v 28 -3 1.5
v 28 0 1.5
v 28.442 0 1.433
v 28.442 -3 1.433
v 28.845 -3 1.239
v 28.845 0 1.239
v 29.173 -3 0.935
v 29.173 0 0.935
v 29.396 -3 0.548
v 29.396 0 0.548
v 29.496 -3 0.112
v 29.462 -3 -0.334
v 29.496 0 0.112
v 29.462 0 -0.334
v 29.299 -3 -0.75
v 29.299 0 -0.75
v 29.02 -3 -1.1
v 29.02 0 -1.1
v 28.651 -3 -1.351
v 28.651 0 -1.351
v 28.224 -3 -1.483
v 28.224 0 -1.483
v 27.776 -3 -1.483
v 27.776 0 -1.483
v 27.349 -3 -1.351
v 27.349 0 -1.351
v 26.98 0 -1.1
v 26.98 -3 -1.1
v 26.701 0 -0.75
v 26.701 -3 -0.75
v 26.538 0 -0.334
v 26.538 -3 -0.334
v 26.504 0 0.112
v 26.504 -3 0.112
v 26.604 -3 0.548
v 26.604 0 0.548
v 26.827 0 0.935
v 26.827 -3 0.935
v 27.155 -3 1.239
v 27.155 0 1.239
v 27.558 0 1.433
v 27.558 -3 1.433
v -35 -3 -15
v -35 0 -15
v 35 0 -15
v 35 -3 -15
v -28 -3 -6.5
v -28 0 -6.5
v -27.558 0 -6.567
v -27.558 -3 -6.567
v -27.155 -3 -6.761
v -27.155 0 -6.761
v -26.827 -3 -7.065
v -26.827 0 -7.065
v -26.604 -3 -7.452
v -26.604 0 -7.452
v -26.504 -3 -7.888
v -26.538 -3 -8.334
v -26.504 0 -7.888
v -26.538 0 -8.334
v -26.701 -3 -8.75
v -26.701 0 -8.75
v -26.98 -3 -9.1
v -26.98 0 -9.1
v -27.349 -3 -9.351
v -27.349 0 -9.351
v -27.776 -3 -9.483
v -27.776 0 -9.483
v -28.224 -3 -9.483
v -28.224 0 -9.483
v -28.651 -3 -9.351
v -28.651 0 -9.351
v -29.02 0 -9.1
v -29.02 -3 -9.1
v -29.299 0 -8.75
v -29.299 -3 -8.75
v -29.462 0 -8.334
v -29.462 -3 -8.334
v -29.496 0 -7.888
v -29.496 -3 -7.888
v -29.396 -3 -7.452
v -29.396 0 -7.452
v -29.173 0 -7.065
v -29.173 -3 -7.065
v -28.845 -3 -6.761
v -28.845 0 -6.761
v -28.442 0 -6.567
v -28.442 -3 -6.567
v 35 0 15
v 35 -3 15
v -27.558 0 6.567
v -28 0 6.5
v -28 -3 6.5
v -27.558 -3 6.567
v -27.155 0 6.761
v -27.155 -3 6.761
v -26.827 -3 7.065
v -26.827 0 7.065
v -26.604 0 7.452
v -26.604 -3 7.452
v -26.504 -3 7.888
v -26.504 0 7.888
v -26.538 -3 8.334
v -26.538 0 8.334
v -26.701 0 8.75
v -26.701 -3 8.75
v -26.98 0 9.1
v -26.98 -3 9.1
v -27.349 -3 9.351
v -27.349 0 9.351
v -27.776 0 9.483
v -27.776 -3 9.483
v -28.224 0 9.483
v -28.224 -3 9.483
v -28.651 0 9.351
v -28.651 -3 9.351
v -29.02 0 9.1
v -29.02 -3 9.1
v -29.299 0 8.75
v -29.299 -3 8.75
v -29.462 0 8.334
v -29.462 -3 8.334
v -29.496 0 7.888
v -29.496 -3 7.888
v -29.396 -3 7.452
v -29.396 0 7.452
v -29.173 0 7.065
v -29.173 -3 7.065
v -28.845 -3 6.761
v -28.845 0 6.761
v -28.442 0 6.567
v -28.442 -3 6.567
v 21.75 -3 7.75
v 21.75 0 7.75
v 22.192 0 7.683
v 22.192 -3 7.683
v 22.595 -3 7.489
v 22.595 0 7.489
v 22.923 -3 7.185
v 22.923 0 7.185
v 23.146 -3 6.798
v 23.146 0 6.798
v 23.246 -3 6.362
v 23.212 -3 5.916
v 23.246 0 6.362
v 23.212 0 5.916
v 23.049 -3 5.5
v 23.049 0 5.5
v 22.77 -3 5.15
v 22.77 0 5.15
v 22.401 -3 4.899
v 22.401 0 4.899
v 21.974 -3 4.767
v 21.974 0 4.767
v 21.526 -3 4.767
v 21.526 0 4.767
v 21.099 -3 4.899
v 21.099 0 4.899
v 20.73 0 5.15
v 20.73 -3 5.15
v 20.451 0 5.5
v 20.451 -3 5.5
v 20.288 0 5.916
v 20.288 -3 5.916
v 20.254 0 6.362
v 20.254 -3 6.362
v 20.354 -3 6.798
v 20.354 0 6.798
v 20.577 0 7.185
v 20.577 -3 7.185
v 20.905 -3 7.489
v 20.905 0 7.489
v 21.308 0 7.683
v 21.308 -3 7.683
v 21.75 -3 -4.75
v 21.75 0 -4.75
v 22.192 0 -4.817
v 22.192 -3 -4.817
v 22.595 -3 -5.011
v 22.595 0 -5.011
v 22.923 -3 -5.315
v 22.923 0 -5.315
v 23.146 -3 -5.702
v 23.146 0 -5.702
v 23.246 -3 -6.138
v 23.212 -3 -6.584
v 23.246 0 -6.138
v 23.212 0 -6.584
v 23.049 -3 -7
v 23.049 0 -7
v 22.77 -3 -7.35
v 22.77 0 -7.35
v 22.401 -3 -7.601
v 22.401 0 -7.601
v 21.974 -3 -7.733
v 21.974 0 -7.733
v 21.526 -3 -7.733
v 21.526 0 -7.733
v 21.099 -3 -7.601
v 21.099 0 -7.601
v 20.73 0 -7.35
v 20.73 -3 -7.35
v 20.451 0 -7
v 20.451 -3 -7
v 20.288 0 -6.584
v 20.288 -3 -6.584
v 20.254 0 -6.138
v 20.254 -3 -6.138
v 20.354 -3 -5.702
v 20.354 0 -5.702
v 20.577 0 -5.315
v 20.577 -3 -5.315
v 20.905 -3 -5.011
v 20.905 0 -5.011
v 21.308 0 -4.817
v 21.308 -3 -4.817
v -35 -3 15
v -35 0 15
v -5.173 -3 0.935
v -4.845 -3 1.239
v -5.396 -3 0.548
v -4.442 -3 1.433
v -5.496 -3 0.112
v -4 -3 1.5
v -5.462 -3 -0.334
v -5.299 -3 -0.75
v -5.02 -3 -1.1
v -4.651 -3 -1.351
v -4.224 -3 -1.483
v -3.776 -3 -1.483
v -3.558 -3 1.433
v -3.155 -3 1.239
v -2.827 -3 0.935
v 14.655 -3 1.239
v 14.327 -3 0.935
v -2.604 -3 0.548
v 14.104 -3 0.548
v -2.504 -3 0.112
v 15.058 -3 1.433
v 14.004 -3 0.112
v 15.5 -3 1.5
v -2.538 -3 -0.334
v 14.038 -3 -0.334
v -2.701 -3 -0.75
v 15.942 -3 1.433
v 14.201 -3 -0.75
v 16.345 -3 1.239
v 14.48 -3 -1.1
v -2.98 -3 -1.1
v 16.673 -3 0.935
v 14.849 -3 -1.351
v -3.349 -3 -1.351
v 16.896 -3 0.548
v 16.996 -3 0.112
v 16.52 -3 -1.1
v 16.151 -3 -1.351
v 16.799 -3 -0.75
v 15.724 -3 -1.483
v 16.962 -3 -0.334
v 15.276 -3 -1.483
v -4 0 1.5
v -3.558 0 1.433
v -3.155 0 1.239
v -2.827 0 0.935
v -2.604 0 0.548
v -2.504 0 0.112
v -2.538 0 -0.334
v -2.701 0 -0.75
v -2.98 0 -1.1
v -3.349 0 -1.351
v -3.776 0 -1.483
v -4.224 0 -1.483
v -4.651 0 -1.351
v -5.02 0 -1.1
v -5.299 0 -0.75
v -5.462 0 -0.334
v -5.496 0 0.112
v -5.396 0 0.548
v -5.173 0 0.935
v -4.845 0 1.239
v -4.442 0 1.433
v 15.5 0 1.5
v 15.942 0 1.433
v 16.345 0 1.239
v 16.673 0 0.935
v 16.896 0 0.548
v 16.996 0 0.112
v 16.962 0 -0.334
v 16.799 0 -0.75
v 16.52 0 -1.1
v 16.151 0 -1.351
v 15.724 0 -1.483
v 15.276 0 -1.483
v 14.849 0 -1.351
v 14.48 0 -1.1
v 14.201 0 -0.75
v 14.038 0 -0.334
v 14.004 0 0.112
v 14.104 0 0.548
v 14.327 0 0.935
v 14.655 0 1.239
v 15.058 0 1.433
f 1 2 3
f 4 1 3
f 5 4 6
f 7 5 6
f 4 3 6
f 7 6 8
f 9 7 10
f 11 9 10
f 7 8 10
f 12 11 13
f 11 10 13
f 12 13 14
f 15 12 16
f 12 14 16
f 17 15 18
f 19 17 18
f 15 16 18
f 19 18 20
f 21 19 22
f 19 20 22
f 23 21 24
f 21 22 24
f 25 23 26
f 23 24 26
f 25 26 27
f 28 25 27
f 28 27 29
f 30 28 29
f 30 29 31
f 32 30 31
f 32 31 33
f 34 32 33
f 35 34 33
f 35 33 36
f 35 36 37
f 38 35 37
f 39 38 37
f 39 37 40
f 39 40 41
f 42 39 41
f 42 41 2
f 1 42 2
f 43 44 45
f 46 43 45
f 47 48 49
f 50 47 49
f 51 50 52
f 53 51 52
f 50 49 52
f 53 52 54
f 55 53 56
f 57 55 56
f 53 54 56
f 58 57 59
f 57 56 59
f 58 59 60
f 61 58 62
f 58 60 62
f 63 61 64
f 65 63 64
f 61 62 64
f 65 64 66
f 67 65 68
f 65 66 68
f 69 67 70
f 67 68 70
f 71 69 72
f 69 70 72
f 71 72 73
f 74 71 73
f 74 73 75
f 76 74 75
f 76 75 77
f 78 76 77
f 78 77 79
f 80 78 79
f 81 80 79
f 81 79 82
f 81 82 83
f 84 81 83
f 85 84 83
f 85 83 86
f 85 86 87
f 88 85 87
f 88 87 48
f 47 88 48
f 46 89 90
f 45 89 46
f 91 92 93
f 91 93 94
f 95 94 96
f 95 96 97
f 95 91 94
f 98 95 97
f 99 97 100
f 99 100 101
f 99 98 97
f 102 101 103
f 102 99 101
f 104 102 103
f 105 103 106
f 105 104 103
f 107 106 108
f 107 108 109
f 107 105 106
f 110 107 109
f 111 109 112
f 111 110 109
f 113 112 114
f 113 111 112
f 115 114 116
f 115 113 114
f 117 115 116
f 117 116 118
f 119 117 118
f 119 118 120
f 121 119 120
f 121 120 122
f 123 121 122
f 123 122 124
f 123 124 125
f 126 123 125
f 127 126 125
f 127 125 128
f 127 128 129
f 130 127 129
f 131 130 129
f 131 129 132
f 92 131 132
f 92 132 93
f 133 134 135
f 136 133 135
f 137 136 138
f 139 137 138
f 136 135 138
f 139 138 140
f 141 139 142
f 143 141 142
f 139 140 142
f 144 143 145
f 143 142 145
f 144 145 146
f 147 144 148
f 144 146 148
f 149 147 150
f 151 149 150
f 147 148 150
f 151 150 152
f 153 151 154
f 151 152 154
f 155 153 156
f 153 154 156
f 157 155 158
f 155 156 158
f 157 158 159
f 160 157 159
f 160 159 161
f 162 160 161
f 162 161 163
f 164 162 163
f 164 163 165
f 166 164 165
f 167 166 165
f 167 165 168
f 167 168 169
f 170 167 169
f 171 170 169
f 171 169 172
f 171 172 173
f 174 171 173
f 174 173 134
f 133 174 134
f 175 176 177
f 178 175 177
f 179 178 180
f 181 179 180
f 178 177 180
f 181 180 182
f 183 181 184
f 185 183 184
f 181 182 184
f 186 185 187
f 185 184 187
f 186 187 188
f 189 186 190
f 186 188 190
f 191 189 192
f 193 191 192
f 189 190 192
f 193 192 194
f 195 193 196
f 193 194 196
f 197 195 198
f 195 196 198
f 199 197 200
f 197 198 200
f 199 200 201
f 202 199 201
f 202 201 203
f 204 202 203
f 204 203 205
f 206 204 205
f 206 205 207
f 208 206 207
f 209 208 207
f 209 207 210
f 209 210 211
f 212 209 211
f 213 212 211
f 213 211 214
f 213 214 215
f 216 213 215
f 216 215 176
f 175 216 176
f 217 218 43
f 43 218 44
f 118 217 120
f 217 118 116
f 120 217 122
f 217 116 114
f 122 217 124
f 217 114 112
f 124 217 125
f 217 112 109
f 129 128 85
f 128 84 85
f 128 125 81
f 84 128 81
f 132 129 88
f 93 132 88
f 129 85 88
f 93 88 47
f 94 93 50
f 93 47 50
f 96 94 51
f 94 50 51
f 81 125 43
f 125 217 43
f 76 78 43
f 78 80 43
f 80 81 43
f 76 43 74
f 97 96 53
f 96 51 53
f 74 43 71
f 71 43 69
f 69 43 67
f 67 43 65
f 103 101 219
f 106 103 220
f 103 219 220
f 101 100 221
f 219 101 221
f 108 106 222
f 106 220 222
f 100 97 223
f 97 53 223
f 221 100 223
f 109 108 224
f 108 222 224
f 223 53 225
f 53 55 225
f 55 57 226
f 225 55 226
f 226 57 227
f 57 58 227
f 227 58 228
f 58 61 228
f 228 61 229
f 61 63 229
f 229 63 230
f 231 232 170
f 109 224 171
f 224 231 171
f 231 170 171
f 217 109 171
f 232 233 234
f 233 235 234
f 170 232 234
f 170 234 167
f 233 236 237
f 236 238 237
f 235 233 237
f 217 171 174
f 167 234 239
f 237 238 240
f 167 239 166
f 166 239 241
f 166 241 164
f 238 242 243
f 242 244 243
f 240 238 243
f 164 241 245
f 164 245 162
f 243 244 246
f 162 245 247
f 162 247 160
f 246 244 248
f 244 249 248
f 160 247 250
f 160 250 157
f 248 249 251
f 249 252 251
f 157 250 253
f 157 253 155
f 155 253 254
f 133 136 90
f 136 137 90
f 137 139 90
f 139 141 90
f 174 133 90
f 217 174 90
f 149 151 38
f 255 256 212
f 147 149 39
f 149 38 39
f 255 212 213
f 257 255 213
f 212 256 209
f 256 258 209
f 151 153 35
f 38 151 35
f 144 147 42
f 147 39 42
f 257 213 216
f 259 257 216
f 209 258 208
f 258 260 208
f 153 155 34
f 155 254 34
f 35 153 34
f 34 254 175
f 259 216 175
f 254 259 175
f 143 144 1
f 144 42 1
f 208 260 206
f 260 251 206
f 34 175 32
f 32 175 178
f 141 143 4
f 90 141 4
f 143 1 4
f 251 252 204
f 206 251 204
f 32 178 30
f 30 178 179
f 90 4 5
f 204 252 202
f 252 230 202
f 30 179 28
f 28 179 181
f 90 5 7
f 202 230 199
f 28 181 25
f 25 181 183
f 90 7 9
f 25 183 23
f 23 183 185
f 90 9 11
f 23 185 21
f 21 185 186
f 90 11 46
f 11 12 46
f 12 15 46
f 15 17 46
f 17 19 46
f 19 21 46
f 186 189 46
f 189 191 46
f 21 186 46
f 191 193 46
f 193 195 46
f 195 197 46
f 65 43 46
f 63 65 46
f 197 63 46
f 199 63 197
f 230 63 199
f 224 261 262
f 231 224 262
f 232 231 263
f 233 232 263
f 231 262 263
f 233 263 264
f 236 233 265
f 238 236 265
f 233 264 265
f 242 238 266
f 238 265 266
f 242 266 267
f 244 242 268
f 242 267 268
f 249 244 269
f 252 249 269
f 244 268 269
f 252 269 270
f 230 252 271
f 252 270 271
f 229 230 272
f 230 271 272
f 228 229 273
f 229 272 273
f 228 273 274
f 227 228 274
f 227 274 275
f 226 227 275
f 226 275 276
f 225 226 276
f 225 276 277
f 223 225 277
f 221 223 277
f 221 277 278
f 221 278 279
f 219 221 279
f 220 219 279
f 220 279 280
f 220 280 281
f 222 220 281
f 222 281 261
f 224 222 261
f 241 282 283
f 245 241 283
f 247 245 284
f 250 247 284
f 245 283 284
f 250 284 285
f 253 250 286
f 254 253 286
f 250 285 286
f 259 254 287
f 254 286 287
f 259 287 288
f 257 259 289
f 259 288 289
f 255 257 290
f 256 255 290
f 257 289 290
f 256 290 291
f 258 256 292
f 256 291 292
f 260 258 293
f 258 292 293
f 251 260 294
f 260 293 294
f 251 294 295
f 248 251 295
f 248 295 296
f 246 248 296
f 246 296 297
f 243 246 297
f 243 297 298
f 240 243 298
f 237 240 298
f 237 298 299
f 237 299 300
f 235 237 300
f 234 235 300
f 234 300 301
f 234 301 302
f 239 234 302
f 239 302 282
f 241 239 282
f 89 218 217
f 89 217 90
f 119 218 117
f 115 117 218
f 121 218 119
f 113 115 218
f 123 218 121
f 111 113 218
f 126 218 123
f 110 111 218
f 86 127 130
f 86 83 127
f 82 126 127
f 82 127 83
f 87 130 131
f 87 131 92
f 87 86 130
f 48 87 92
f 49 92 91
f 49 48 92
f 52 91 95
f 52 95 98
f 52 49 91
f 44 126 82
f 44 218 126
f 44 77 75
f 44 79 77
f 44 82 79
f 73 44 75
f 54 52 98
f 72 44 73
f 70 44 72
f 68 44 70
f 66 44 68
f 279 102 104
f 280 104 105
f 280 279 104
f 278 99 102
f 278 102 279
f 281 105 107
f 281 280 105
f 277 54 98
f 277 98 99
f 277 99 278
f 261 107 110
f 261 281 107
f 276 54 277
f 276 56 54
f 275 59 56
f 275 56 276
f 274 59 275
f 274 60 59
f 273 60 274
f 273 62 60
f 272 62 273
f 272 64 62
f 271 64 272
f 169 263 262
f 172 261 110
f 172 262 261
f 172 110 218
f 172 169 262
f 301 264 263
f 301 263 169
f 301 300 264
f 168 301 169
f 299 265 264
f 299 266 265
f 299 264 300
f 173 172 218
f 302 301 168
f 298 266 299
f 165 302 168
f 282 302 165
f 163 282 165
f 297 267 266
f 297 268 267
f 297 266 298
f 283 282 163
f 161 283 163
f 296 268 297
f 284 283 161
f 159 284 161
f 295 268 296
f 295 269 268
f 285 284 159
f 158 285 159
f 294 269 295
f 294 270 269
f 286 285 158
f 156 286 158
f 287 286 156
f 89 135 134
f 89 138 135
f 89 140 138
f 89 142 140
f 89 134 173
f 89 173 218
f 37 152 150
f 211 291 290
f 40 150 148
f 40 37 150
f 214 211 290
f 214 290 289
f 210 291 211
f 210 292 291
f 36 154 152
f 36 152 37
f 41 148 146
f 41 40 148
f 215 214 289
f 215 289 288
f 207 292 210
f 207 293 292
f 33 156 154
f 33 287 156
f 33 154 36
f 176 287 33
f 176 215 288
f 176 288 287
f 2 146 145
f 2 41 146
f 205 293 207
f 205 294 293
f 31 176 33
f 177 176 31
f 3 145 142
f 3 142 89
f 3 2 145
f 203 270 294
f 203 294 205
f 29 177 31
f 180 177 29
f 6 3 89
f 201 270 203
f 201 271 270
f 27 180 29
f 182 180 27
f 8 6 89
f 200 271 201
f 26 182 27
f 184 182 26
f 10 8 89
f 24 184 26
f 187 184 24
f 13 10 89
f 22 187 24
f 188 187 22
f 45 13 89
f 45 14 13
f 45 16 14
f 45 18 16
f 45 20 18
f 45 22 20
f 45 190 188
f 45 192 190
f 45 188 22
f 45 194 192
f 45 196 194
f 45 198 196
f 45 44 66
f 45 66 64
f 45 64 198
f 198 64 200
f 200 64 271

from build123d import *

# Parameters (mm, degrees)
SZKIC1_W                   = 70
SZKIC1_H                   = 30
ODGI_CIE_BAZOWE1_DEPTH     = 3
WYTNIJ_WYCI_GNI_CIE1_REACH = 40.197
SZKIC6_R                   = 1.5
WYTNIJ_WYCI_GNI_CIE2_REACH = 40.197
SZKIC7_R                   = 1.5
WYTNIJ_WYCI_GNI_CIE3_REACH = 40.197
SZKIC10_R                  = 1.5


# Sheet-metal steps are written as plain solids
with BuildPart() as part:
    # Szkic1 → Odgięcie bazowe1 (new body)
    with BuildSketch(Plane(origin=(0, 0, 0), x_dir=(1, 0, 0), z_dir=(0, 1, 0))):
        Rectangle(SZKIC1_W, SZKIC1_H)
    extrude(amount=-ODGI_CIE_BAZOWE1_DEPTH)

    # Szkic6 → Wytnij-wyciągnięcie1 (cut, up to next)
    with BuildSketch(Plane(origin=(0, 0, 0), x_dir=(1, 0, 0), z_dir=(0, 1, 0)), mode=Mode.PRIVATE) as wytnij_wyci_gni_cie1_sk1:
        with Locations(Location((-28, 8, 0), (0, 0, 270))):
            Circle(SZKIC6_R)
    wytnij_wyci_gni_cie1_tool1 = extrude(wytnij_wyci_gni_cie1_sk1.sketch, amount=-WYTNIJ_WYCI_GNI_CIE1_REACH, mode=Mode.PRIVATE) & part.part
    wytnij_wyci_gni_cie1 = wytnij_wyci_gni_cie1_tool1.solids().sort_by_distance((-28, 0, -8))[0]
    add(wytnij_wyci_gni_cie1, mode=Mode.SUBTRACT)

    # Lustro1: Wytnij-wyciągnięcie1 across plane
    add(wytnij_wyci_gni_cie1.mirror(Plane.XY), mode=Mode.SUBTRACT)

    # Szkic7 → Wytnij-wyciągnięcie2 (cut, up to next)
    with BuildSketch(Plane(origin=(0, 0, 0), x_dir=(1, 0, 0), z_dir=(0, 1, 0)), mode=Mode.PRIVATE) as wytnij_wyci_gni_cie2_sk1:
        with Locations(Location((28, 0, 0), (0, 0, 270))):
            Circle(SZKIC7_R)
    wytnij_wyci_gni_cie2_tool1 = extrude(wytnij_wyci_gni_cie2_sk1.sketch, amount=-WYTNIJ_WYCI_GNI_CIE2_REACH, mode=Mode.PRIVATE) & part.part
    wytnij_wyci_gni_cie2 = wytnij_wyci_gni_cie2_tool1.solids().sort_by_distance((28, 0, 0))[0]
    add(wytnij_wyci_gni_cie2, mode=Mode.SUBTRACT)

    # Szkic-szyk1: Wytnij-wyciągnięcie2 at 3 more places
    with Locations((-12.5, 0, 0), (-6.25, 0, -6.25), (-6.25, 0, 6.25)):
        add(wytnij_wyci_gni_cie2, mode=Mode.SUBTRACT)

    # Szkic10 → Wytnij-wyciągnięcie3 (cut, up to next)
    with BuildSketch(Plane(origin=(0, 0, 0), x_dir=(1, 0, 0), z_dir=(0, 1, 0)), mode=Mode.PRIVATE) as wytnij_wyci_gni_cie3_sk1:
        with Locations(Location((-4, 0, 0), (0, 0, 270))):
            Circle(SZKIC10_R)
    wytnij_wyci_gni_cie3_tool1 = extrude(wytnij_wyci_gni_cie3_sk1.sketch, amount=-WYTNIJ_WYCI_GNI_CIE3_REACH, mode=Mode.PRIVATE) & part.part
    add(wytnij_wyci_gni_cie3_tool1.solids().sort_by_distance((-4, 0, 0))[0], mode=Mode.SUBTRACT)


solid = part.part
